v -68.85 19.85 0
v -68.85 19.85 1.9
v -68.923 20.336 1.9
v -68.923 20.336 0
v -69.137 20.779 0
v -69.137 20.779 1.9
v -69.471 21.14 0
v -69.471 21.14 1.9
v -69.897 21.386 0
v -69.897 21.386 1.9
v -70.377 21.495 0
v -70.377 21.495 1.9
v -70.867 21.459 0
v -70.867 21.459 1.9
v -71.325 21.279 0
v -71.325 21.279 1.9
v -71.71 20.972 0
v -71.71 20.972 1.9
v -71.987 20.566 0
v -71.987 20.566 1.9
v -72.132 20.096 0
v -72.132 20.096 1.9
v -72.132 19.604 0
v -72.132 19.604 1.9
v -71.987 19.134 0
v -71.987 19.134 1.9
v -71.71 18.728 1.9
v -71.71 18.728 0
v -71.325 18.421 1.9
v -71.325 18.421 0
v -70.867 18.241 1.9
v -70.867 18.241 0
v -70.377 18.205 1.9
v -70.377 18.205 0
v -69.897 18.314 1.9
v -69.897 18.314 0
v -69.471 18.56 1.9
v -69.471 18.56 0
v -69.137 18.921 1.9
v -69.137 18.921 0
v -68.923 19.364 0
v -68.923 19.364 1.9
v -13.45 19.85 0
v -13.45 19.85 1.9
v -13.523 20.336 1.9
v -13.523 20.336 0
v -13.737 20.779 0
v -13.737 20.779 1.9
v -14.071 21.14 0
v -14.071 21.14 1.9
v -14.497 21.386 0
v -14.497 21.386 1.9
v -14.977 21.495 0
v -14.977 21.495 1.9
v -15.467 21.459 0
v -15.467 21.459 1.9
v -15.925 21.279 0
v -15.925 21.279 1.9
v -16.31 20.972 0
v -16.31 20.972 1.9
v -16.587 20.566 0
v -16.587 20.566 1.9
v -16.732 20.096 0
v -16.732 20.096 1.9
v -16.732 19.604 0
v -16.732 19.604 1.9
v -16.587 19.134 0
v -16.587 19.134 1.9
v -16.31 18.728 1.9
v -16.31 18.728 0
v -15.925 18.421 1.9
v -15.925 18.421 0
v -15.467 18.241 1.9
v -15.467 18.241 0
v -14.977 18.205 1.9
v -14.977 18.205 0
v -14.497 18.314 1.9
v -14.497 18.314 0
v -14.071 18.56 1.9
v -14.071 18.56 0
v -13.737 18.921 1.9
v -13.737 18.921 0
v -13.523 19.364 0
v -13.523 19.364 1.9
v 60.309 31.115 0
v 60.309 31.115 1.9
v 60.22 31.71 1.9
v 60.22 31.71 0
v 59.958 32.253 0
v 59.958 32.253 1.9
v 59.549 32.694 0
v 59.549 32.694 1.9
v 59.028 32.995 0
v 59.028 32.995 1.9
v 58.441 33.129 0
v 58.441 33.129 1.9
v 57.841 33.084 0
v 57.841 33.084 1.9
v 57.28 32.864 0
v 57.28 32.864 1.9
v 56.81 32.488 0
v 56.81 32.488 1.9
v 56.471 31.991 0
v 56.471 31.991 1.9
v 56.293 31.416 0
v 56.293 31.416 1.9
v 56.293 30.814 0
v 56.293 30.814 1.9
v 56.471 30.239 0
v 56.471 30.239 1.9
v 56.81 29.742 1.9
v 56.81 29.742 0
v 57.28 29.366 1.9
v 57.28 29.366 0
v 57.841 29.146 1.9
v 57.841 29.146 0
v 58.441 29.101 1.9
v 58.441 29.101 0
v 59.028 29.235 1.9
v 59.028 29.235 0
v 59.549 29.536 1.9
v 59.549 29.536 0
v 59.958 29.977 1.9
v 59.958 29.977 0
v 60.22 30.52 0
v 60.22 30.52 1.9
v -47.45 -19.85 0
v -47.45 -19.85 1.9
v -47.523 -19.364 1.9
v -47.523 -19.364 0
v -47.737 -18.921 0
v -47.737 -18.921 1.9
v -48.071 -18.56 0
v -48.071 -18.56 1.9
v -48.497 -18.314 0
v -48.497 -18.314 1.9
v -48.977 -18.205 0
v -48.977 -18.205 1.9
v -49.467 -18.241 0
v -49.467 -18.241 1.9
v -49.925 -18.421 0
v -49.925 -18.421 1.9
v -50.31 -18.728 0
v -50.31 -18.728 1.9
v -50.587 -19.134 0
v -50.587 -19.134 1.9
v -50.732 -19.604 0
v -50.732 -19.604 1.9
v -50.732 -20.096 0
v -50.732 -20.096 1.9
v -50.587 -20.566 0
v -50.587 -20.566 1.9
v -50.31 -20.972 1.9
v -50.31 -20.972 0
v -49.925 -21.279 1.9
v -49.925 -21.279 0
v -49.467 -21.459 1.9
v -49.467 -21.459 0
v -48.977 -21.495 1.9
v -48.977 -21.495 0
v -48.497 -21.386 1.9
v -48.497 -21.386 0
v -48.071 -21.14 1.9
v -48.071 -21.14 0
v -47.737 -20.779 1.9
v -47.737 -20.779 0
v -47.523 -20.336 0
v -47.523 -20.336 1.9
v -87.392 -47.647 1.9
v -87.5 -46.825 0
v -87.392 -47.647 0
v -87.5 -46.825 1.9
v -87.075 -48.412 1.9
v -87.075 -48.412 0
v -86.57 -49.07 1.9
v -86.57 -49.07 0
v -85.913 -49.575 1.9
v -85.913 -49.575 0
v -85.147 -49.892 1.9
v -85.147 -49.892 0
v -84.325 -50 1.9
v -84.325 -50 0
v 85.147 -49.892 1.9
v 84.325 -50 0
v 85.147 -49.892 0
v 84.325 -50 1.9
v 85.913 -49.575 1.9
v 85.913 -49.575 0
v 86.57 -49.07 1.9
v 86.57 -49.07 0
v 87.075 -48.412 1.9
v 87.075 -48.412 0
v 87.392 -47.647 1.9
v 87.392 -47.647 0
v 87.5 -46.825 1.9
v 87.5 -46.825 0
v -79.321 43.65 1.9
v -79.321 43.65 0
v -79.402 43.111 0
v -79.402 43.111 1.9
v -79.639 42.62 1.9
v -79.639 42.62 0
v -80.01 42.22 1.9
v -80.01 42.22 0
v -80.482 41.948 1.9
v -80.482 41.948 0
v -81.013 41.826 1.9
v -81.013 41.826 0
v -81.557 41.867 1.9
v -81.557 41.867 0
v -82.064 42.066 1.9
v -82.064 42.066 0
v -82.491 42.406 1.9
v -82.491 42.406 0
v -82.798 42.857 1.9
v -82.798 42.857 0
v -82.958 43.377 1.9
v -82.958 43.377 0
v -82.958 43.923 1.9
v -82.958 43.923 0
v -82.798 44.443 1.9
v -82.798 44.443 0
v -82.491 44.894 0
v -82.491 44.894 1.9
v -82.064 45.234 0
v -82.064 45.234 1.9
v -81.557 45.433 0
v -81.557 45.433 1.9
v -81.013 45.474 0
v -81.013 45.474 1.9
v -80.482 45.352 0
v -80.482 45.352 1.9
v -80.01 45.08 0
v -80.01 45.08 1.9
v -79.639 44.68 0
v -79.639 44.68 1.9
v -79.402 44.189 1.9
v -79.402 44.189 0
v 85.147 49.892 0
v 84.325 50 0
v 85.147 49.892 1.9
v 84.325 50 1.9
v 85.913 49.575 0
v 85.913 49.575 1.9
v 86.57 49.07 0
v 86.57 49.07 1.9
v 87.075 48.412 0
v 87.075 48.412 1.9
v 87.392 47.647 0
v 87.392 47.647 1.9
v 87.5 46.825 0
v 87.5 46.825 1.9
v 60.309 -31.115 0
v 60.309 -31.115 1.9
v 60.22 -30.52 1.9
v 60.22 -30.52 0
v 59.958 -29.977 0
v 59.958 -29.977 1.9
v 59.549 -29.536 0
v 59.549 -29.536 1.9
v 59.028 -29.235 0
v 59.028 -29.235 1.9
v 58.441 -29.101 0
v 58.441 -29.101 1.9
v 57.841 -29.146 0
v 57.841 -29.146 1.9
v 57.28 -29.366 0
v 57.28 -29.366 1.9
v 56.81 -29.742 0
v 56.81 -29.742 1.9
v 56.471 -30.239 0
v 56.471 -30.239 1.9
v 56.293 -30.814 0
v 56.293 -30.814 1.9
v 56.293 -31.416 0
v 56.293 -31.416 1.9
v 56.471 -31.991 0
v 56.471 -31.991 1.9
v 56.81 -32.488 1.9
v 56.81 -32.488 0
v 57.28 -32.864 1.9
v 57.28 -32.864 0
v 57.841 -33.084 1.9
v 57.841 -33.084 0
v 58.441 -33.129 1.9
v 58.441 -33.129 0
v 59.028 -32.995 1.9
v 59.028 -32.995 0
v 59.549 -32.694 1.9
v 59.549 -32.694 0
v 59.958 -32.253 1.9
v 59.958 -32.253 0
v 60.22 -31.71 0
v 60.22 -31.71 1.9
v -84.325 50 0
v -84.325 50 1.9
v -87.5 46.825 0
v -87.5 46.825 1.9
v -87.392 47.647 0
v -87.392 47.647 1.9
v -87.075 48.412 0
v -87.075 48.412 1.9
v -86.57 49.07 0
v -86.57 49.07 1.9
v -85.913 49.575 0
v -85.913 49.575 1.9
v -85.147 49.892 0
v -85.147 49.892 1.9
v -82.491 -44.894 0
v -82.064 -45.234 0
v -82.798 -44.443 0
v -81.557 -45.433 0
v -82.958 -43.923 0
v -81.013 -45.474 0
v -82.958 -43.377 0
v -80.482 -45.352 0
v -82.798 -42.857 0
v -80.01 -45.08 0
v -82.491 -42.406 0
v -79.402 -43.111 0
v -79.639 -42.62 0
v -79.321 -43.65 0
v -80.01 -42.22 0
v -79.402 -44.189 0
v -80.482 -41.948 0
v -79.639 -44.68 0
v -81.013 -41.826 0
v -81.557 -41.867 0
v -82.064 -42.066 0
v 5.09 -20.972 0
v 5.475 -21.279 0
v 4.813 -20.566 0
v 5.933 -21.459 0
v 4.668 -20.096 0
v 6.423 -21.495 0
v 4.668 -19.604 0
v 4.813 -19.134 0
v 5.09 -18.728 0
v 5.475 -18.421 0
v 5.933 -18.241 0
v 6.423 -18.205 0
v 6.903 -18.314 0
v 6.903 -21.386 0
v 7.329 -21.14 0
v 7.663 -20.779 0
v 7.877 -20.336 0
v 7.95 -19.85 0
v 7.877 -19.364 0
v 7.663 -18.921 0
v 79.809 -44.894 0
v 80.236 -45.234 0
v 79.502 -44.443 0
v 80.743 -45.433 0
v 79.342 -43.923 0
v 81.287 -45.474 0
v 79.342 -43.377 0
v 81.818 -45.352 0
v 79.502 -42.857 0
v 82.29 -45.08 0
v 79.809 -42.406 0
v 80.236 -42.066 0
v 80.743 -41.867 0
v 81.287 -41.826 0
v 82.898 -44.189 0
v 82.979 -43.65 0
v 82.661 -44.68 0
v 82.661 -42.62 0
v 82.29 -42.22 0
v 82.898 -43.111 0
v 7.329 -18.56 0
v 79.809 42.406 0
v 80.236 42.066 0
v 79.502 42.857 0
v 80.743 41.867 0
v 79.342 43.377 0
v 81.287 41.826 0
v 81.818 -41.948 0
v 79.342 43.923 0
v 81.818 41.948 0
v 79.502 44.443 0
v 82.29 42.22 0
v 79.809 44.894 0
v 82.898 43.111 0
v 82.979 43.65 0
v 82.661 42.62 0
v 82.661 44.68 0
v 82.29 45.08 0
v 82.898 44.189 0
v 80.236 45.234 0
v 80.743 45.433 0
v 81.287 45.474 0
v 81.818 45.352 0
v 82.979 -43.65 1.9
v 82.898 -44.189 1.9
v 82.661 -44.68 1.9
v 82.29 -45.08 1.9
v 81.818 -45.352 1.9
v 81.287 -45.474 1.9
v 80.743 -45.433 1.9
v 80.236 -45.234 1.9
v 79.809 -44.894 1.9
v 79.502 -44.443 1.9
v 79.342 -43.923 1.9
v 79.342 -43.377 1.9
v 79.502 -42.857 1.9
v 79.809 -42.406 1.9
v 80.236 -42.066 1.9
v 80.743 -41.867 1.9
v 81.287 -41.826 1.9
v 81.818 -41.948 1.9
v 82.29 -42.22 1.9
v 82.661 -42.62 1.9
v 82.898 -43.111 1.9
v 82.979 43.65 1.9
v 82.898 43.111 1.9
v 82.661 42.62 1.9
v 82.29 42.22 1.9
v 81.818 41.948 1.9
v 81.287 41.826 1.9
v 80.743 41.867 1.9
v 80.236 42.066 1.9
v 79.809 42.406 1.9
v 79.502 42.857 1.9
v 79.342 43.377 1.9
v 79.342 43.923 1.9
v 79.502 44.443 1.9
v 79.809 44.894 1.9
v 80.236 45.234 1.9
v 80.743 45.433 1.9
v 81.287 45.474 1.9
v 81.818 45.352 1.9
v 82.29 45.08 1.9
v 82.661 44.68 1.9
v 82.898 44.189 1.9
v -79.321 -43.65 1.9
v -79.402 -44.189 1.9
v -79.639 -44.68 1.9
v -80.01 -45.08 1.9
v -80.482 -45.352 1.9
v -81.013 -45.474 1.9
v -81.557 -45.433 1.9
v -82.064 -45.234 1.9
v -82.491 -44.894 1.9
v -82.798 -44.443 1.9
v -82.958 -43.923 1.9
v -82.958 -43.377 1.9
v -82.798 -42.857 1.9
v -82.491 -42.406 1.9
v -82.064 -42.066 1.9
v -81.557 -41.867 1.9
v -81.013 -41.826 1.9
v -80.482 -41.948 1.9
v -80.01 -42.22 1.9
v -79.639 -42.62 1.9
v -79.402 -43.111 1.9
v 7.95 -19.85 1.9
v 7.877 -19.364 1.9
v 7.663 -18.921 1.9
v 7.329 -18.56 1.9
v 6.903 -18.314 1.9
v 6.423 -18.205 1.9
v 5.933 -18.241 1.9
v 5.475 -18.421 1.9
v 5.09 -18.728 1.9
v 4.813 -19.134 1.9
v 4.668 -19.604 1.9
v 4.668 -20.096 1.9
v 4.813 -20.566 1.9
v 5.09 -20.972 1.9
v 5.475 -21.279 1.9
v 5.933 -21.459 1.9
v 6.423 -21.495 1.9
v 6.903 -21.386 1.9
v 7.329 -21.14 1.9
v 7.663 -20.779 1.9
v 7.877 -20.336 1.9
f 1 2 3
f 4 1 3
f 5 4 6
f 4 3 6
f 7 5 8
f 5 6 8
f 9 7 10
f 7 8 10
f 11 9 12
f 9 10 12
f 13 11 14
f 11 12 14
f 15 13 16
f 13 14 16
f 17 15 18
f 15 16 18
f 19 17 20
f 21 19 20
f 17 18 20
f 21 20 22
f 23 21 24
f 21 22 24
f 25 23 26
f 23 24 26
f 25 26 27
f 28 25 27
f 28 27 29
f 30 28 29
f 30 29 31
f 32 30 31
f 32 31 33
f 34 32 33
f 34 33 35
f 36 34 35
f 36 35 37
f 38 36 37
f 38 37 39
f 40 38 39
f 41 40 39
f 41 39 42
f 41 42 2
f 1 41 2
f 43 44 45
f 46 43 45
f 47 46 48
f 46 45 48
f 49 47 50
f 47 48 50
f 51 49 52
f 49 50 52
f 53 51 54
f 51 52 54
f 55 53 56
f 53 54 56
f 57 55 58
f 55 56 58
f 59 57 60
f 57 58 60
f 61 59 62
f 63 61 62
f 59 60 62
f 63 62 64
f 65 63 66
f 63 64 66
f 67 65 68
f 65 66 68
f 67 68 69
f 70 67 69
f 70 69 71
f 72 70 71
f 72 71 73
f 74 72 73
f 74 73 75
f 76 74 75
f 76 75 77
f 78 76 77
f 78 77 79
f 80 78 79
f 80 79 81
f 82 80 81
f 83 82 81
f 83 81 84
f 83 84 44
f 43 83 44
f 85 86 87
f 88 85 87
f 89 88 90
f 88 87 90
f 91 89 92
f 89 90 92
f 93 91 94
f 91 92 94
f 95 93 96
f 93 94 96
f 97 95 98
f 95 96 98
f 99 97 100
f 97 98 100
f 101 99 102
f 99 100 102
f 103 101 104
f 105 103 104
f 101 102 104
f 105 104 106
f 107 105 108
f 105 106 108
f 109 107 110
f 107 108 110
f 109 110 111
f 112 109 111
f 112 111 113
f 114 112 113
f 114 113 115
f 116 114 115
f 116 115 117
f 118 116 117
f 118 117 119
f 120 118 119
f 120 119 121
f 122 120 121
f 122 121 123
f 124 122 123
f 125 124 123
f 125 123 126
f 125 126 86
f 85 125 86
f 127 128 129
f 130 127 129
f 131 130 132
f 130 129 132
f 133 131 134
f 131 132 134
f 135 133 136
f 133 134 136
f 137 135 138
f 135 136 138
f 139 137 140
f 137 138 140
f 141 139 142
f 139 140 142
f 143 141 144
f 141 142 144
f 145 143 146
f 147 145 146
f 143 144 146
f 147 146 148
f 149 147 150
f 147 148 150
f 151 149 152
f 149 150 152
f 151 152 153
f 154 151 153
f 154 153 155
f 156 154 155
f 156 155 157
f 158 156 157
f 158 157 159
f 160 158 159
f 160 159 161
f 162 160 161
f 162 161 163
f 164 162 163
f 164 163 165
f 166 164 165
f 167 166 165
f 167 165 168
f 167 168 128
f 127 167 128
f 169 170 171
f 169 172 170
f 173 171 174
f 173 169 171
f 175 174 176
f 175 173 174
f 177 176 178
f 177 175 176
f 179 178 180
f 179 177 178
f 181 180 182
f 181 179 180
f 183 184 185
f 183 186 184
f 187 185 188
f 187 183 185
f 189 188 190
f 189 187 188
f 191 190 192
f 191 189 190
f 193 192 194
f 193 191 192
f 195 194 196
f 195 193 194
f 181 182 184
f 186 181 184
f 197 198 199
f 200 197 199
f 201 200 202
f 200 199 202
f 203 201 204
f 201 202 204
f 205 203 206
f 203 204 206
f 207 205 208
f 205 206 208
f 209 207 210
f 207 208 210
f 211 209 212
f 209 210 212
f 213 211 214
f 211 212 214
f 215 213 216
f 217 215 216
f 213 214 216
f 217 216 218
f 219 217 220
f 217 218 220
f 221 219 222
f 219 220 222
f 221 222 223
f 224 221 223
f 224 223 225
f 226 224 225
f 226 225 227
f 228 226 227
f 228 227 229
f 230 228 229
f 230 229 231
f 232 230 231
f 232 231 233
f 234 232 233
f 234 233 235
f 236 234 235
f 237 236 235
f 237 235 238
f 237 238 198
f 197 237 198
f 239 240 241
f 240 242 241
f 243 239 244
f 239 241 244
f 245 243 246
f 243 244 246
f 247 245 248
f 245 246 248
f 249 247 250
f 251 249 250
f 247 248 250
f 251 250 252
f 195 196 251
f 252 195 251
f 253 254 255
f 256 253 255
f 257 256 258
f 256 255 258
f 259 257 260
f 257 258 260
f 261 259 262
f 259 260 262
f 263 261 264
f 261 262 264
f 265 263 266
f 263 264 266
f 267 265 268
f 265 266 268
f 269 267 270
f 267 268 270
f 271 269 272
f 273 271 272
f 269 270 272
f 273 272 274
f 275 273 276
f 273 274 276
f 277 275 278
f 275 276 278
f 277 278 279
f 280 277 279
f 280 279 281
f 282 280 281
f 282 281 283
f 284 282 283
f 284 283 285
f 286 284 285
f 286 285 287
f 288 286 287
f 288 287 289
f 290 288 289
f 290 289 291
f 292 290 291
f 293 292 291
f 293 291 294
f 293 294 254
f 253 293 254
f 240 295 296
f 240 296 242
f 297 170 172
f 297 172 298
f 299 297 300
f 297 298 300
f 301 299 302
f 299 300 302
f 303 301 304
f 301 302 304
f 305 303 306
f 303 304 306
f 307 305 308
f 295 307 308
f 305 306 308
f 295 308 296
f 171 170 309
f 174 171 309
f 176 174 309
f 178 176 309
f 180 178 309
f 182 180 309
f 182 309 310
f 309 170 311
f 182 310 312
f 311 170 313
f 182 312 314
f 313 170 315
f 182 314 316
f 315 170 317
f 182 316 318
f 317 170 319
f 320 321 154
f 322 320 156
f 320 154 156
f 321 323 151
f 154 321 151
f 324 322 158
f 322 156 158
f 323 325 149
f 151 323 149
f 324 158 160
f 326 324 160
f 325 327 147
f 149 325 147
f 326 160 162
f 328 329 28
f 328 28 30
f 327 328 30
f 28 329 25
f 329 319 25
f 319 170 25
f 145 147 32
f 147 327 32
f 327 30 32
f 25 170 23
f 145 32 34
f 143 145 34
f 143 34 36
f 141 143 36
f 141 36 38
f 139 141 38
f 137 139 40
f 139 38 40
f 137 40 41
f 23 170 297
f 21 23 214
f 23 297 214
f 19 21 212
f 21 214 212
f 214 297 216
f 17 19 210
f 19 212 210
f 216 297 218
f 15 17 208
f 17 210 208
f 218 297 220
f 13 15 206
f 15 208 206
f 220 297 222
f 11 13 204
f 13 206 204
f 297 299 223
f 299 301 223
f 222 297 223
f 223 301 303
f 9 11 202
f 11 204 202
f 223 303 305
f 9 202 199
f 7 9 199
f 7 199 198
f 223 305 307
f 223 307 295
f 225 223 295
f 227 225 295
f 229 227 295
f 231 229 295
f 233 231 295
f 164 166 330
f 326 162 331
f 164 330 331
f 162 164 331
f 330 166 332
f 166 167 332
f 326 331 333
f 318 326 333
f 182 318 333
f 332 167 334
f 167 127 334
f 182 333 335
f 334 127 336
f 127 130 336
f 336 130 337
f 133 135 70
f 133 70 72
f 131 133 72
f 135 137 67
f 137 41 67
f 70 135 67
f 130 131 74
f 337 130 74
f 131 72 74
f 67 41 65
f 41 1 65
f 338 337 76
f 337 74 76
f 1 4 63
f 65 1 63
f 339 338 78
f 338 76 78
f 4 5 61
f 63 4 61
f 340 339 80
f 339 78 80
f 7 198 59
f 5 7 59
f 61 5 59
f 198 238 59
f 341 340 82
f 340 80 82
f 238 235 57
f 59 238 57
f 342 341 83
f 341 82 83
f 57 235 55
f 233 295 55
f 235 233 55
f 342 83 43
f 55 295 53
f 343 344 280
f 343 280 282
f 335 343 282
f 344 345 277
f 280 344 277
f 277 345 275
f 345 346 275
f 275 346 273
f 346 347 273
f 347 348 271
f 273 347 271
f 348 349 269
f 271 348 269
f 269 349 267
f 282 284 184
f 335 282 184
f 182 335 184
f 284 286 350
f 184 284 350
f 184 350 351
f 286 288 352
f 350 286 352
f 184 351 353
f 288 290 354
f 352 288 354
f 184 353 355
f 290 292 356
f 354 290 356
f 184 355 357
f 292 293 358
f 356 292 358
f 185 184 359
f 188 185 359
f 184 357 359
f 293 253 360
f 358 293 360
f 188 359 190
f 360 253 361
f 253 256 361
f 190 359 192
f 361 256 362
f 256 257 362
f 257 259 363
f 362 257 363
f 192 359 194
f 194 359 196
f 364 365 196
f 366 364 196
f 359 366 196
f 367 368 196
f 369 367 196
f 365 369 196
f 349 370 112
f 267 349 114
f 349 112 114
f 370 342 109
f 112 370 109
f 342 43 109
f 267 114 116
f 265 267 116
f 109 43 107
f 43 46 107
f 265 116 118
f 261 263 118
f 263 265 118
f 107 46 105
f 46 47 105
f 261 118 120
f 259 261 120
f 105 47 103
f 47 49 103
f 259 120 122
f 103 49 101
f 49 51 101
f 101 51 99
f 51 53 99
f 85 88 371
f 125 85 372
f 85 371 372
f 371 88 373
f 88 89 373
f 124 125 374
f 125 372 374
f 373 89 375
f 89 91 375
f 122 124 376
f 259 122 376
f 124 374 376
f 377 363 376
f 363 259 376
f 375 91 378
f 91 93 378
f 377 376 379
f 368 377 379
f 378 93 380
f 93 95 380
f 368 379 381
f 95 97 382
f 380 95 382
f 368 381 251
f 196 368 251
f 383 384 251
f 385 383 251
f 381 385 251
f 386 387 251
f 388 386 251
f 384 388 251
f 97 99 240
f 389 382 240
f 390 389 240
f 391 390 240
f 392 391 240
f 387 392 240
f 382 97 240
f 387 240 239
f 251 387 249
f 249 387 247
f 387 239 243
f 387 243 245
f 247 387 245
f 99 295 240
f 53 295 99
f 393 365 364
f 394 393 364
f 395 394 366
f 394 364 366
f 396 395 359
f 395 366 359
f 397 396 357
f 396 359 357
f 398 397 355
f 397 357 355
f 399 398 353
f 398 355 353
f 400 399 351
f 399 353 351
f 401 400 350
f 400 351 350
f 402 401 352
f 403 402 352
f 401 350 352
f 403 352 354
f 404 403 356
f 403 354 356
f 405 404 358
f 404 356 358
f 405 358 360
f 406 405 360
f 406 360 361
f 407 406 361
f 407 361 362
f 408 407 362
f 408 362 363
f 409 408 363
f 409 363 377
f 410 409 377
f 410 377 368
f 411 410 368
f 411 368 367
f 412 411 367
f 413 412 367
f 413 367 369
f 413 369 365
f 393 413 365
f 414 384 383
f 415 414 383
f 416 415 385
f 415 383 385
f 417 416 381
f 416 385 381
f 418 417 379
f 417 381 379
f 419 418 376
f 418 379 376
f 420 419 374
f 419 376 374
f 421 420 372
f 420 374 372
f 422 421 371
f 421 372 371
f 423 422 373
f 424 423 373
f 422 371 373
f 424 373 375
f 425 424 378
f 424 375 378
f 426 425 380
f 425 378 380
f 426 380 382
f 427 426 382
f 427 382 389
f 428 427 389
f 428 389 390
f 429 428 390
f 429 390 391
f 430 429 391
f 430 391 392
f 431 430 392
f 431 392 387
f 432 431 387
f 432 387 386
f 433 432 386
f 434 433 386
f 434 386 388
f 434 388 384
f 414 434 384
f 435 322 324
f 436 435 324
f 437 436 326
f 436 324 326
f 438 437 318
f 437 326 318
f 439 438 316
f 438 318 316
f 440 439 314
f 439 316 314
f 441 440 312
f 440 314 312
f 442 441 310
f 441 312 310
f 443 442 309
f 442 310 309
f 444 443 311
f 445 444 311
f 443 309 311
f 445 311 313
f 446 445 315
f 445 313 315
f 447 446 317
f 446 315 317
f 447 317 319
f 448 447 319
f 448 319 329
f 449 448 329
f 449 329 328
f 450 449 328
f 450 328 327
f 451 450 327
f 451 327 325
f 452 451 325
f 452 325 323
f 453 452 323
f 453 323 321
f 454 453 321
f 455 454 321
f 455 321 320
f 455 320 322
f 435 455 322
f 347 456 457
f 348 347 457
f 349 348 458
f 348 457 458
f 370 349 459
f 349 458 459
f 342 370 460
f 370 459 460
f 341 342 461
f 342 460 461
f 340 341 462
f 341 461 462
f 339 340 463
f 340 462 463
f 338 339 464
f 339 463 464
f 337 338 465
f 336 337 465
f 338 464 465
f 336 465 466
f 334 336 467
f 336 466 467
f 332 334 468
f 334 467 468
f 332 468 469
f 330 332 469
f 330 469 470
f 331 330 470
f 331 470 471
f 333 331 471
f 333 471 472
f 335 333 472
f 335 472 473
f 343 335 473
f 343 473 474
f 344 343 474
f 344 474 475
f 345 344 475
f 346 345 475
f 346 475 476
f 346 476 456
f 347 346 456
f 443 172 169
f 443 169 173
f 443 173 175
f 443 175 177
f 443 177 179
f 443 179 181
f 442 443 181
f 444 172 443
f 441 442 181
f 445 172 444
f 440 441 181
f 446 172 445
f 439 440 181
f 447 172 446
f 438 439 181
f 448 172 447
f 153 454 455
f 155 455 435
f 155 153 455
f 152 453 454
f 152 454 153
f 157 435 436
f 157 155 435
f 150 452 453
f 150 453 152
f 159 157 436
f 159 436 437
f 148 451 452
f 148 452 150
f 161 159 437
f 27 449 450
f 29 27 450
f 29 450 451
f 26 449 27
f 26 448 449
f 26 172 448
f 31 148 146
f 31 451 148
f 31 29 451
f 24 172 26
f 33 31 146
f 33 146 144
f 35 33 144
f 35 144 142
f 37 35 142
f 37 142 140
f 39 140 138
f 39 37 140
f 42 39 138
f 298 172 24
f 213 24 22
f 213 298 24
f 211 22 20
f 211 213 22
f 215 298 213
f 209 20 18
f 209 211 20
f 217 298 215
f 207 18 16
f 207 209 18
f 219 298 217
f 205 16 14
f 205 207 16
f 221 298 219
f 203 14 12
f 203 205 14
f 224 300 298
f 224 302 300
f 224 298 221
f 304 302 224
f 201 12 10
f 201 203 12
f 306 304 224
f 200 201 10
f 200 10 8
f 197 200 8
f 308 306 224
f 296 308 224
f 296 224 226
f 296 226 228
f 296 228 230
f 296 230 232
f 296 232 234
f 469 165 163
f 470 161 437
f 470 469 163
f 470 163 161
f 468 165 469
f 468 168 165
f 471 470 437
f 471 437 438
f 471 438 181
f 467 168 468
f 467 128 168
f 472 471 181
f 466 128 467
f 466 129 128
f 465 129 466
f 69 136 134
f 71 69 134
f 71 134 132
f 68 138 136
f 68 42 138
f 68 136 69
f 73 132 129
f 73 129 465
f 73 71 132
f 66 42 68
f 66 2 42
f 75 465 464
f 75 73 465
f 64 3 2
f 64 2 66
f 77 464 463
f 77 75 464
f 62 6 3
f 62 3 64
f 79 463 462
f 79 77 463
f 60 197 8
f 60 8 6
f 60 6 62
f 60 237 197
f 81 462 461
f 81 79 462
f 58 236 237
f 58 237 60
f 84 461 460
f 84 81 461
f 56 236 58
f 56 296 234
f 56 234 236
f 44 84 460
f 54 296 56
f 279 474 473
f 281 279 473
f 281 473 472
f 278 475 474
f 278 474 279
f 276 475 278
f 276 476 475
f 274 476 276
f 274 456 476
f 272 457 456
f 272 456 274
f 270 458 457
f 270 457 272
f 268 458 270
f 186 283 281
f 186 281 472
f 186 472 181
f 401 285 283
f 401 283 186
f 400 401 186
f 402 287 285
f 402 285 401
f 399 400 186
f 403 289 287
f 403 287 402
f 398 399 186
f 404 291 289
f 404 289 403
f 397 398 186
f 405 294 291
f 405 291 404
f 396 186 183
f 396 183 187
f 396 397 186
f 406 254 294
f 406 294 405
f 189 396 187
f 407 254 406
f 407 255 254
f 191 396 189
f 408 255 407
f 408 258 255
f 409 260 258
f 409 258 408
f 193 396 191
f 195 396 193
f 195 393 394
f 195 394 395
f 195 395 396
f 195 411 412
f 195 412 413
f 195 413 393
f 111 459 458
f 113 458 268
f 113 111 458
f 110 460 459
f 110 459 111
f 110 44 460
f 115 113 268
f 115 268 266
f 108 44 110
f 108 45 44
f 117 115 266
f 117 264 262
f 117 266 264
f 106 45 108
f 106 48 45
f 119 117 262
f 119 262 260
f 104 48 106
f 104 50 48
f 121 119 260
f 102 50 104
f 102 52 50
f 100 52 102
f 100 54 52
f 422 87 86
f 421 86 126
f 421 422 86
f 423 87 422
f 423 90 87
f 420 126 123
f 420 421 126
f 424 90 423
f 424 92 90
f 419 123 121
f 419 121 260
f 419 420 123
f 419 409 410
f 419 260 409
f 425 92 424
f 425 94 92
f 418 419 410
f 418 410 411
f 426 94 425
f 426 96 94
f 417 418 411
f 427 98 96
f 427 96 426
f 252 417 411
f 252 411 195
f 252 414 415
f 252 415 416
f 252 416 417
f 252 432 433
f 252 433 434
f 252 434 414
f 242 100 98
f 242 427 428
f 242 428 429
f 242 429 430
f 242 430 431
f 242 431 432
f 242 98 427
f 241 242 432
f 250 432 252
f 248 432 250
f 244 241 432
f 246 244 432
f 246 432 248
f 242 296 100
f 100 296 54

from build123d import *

# Parameters (mm, degrees)
SKETCH1_W                      = 175
SKETCH1_H                      = 100
BOSS_EXTRUDE1_DEPTH            = 1.9
CUT_EXTRUDE1_REACH             = 102.796
SKETCH2_R                      = 1.8288
CUT_EXTRUDE1_DIRECTION_2_DEPTH = 101.796130878
FILLET1_R                      = 3.175
CUT_EXTRUDE2_REACH             = 102.796
SKETCH3_R                      = 1.65
SKETCH3_R_2                    = 2.0193


with BuildPart() as part:
    # Sketch1 → Boss-Extrude1 (new body)
    with BuildSketch(Plane.XY):
        Rectangle(SKETCH1_W, SKETCH1_H)
    extrude(amount=BOSS_EXTRUDE1_DEPTH)

    # Sketch2 → Cut-Extrude1 (cut, up to next)
    with BuildSketch(Plane(origin=(0, 0, 0), x_dir=(-1, 0, 0), z_dir=(0, 0, -1)), mode=Mode.PRIVATE) as cut_extrude1_sk1:
        with Locations(Location((-81.15, 43.65, 0), (0, 0, 180))):
            Circle(SKETCH2_R)
    cut_extrude1_tool1 = extrude(cut_extrude1_sk1.sketch, amount=-CUT_EXTRUDE1_REACH, mode=Mode.PRIVATE) & part.part
    # Sketch2 → Cut-Extrude1 (cut, up to next)
    with BuildSketch(Plane(origin=(0, 0, 0), x_dir=(-1, 0, 0), z_dir=(0, 0, -1)), mode=Mode.PRIVATE) as cut_extrude1_sk2:
        with Locations(Location((-81.15, -43.65, 0), (0, 0, 180))):
            Circle(SKETCH2_R)
    cut_extrude1_tool2 = extrude(cut_extrude1_sk2.sketch, amount=-CUT_EXTRUDE1_REACH, mode=Mode.PRIVATE) & part.part
    # Sketch2 → Cut-Extrude1 (cut, up to next)
    with BuildSketch(Plane(origin=(0, 0, 0), x_dir=(-1, 0, 0), z_dir=(0, 0, -1)), mode=Mode.PRIVATE) as cut_extrude1_sk3:
        with Locations(Location((81.15, 43.65, 0), (0, 0, 180))):
            Circle(SKETCH2_R)
    cut_extrude1_tool3 = extrude(cut_extrude1_sk3.sketch, amount=-CUT_EXTRUDE1_REACH, mode=Mode.PRIVATE) & part.part
    # Sketch2 → Cut-Extrude1 (cut, up to next)
    with BuildSketch(Plane(origin=(0, 0, 0), x_dir=(-1, 0, 0), z_dir=(0, 0, -1)), mode=Mode.PRIVATE) as cut_extrude1_sk4:
        with Locations(Location((81.15, -43.65, 0), (0, 0, 180))):
            Circle(SKETCH2_R)
    cut_extrude1_tool4 = extrude(cut_extrude1_sk4.sketch, amount=-CUT_EXTRUDE1_REACH, mode=Mode.PRIVATE) & part.part
    add(cut_extrude1_tool1.solids().sort_by_distance((81.15, 43.65, 0))[0], mode=Mode.SUBTRACT)
    add(cut_extrude1_tool2.solids().sort_by_distance((81.15, -43.65, 0))[0], mode=Mode.SUBTRACT)
    add(cut_extrude1_tool3.solids().sort_by_distance((-81.15, 43.65, 0))[0], mode=Mode.SUBTRACT)
    add(cut_extrude1_tool4.solids().sort_by_distance((-81.15, -43.65, 0))[0], mode=Mode.SUBTRACT)

    # Sketch2 → Cut-Extrude1 direction 2 (cut)
    with BuildSketch(Plane(origin=(0, 0, 0), x_dir=(-1, 0, 0), z_dir=(0, 0, -1))):
        with Locations(Location((-81.15, 43.65, 0), (0, 0, 180))):
            Circle(SKETCH2_R)
        with Locations(Location((-81.15, -43.65, 0), (0, 0, 180))):
            Circle(SKETCH2_R)
        with Locations(Location((81.15, 43.65, 0), (0, 0, 180))):
            Circle(SKETCH2_R)
        with Locations(Location((81.15, -43.65, 0), (0, 0, 180))):
            Circle(SKETCH2_R)
    extrude(amount=CUT_EXTRUDE1_DIRECTION_2_DEPTH, mode=Mode.SUBTRACT)

    # Fillet1
    fillet1_edges = [part.edges().sort_by_distance(p)[0] for p in [
        (87.5, -50, 0.95),
        (-87.5, -50, 0.95),
        (-87.5, 50, 0.95),
        (87.5, 50, 0.95),
    ]]
    fillet(fillet1_edges, radius=FILLET1_R)

    # Sketch3 → Cut-Extrude2 (cut, up to next)
    with BuildSketch(Plane.XY.offset(1.9), mode=Mode.PRIVATE) as cut_extrude2_sk1:
        with Locations((-49.1, -19.85)):
            Circle(SKETCH3_R)
    cut_extrude2_tool1 = extrude(cut_extrude2_sk1.sketch, amount=-CUT_EXTRUDE2_REACH, mode=Mode.PRIVATE) & part.part
    # Sketch3 → Cut-Extrude2 (cut, up to next)
    with BuildSketch(Plane.XY.offset(1.9), mode=Mode.PRIVATE) as cut_extrude2_sk2:
        with Locations((-70.5, 19.85)):
            Circle(SKETCH3_R)
    cut_extrude2_tool2 = extrude(cut_extrude2_sk2.sketch, amount=-CUT_EXTRUDE2_REACH, mode=Mode.PRIVATE) & part.part
    # Sketch3 → Cut-Extrude2 (cut, up to next)
    with BuildSketch(Plane.XY.offset(1.9), mode=Mode.PRIVATE) as cut_extrude2_sk3:
        with Locations((6.3, -19.85)):
            Circle(SKETCH3_R)
    cut_extrude2_tool3 = extrude(cut_extrude2_sk3.sketch, amount=-CUT_EXTRUDE2_REACH, mode=Mode.PRIVATE) & part.part
    # Sketch3 → Cut-Extrude2 (cut, up to next)
    with BuildSketch(Plane.XY.offset(1.9), mode=Mode.PRIVATE) as cut_extrude2_sk4:
        with Locations((-15.1, 19.85)):
            Circle(SKETCH3_R)
    cut_extrude2_tool4 = extrude(cut_extrude2_sk4.sketch, amount=-CUT_EXTRUDE2_REACH, mode=Mode.PRIVATE) & part.part
    # Sketch3 → Cut-Extrude2 (cut, up to next)
    with BuildSketch(Plane.XY.offset(1.9), mode=Mode.PRIVATE) as cut_extrude2_sk5:
        with Locations((58.29, -31.115)):
            Circle(SKETCH3_R_2)
    cut_extrude2_tool5 = extrude(cut_extrude2_sk5.sketch, amount=-CUT_EXTRUDE2_REACH, mode=Mode.PRIVATE) & part.part
    # Sketch3 → Cut-Extrude2 (cut, up to next)
    with BuildSketch(Plane.XY.offset(1.9), mode=Mode.PRIVATE) as cut_extrude2_sk6:
        with Locations((58.29, 31.115)):
            Circle(SKETCH3_R_2)
    cut_extrude2_tool6 = extrude(cut_extrude2_sk6.sketch, amount=-CUT_EXTRUDE2_REACH, mode=Mode.PRIVATE) & part.part
    add(cut_extrude2_tool1.solids().sort_by_distance((-49.1, -19.85, 1.9))[0], mode=Mode.SUBTRACT)
    add(cut_extrude2_tool2.solids().sort_by_distance((-70.5, 19.85, 1.9))[0], mode=Mode.SUBTRACT)
    add(cut_extrude2_tool3.solids().sort_by_distance((6.3, -19.85, 1.9))[0], mode=Mode.SUBTRACT)
    add(cut_extrude2_tool4.solids().sort_by_distance((-15.1, 19.85, 1.9))[0], mode=Mode.SUBTRACT)
    add(cut_extrude2_tool5.solids().sort_by_distance((58.29, -31.115, 1.9))[0], mode=Mode.SUBTRACT)
    add(cut_extrude2_tool6.solids().sort_by_distance((58.29, 31.115, 1.9))[0], mode=Mode.SUBTRACT)


solid = part.part
